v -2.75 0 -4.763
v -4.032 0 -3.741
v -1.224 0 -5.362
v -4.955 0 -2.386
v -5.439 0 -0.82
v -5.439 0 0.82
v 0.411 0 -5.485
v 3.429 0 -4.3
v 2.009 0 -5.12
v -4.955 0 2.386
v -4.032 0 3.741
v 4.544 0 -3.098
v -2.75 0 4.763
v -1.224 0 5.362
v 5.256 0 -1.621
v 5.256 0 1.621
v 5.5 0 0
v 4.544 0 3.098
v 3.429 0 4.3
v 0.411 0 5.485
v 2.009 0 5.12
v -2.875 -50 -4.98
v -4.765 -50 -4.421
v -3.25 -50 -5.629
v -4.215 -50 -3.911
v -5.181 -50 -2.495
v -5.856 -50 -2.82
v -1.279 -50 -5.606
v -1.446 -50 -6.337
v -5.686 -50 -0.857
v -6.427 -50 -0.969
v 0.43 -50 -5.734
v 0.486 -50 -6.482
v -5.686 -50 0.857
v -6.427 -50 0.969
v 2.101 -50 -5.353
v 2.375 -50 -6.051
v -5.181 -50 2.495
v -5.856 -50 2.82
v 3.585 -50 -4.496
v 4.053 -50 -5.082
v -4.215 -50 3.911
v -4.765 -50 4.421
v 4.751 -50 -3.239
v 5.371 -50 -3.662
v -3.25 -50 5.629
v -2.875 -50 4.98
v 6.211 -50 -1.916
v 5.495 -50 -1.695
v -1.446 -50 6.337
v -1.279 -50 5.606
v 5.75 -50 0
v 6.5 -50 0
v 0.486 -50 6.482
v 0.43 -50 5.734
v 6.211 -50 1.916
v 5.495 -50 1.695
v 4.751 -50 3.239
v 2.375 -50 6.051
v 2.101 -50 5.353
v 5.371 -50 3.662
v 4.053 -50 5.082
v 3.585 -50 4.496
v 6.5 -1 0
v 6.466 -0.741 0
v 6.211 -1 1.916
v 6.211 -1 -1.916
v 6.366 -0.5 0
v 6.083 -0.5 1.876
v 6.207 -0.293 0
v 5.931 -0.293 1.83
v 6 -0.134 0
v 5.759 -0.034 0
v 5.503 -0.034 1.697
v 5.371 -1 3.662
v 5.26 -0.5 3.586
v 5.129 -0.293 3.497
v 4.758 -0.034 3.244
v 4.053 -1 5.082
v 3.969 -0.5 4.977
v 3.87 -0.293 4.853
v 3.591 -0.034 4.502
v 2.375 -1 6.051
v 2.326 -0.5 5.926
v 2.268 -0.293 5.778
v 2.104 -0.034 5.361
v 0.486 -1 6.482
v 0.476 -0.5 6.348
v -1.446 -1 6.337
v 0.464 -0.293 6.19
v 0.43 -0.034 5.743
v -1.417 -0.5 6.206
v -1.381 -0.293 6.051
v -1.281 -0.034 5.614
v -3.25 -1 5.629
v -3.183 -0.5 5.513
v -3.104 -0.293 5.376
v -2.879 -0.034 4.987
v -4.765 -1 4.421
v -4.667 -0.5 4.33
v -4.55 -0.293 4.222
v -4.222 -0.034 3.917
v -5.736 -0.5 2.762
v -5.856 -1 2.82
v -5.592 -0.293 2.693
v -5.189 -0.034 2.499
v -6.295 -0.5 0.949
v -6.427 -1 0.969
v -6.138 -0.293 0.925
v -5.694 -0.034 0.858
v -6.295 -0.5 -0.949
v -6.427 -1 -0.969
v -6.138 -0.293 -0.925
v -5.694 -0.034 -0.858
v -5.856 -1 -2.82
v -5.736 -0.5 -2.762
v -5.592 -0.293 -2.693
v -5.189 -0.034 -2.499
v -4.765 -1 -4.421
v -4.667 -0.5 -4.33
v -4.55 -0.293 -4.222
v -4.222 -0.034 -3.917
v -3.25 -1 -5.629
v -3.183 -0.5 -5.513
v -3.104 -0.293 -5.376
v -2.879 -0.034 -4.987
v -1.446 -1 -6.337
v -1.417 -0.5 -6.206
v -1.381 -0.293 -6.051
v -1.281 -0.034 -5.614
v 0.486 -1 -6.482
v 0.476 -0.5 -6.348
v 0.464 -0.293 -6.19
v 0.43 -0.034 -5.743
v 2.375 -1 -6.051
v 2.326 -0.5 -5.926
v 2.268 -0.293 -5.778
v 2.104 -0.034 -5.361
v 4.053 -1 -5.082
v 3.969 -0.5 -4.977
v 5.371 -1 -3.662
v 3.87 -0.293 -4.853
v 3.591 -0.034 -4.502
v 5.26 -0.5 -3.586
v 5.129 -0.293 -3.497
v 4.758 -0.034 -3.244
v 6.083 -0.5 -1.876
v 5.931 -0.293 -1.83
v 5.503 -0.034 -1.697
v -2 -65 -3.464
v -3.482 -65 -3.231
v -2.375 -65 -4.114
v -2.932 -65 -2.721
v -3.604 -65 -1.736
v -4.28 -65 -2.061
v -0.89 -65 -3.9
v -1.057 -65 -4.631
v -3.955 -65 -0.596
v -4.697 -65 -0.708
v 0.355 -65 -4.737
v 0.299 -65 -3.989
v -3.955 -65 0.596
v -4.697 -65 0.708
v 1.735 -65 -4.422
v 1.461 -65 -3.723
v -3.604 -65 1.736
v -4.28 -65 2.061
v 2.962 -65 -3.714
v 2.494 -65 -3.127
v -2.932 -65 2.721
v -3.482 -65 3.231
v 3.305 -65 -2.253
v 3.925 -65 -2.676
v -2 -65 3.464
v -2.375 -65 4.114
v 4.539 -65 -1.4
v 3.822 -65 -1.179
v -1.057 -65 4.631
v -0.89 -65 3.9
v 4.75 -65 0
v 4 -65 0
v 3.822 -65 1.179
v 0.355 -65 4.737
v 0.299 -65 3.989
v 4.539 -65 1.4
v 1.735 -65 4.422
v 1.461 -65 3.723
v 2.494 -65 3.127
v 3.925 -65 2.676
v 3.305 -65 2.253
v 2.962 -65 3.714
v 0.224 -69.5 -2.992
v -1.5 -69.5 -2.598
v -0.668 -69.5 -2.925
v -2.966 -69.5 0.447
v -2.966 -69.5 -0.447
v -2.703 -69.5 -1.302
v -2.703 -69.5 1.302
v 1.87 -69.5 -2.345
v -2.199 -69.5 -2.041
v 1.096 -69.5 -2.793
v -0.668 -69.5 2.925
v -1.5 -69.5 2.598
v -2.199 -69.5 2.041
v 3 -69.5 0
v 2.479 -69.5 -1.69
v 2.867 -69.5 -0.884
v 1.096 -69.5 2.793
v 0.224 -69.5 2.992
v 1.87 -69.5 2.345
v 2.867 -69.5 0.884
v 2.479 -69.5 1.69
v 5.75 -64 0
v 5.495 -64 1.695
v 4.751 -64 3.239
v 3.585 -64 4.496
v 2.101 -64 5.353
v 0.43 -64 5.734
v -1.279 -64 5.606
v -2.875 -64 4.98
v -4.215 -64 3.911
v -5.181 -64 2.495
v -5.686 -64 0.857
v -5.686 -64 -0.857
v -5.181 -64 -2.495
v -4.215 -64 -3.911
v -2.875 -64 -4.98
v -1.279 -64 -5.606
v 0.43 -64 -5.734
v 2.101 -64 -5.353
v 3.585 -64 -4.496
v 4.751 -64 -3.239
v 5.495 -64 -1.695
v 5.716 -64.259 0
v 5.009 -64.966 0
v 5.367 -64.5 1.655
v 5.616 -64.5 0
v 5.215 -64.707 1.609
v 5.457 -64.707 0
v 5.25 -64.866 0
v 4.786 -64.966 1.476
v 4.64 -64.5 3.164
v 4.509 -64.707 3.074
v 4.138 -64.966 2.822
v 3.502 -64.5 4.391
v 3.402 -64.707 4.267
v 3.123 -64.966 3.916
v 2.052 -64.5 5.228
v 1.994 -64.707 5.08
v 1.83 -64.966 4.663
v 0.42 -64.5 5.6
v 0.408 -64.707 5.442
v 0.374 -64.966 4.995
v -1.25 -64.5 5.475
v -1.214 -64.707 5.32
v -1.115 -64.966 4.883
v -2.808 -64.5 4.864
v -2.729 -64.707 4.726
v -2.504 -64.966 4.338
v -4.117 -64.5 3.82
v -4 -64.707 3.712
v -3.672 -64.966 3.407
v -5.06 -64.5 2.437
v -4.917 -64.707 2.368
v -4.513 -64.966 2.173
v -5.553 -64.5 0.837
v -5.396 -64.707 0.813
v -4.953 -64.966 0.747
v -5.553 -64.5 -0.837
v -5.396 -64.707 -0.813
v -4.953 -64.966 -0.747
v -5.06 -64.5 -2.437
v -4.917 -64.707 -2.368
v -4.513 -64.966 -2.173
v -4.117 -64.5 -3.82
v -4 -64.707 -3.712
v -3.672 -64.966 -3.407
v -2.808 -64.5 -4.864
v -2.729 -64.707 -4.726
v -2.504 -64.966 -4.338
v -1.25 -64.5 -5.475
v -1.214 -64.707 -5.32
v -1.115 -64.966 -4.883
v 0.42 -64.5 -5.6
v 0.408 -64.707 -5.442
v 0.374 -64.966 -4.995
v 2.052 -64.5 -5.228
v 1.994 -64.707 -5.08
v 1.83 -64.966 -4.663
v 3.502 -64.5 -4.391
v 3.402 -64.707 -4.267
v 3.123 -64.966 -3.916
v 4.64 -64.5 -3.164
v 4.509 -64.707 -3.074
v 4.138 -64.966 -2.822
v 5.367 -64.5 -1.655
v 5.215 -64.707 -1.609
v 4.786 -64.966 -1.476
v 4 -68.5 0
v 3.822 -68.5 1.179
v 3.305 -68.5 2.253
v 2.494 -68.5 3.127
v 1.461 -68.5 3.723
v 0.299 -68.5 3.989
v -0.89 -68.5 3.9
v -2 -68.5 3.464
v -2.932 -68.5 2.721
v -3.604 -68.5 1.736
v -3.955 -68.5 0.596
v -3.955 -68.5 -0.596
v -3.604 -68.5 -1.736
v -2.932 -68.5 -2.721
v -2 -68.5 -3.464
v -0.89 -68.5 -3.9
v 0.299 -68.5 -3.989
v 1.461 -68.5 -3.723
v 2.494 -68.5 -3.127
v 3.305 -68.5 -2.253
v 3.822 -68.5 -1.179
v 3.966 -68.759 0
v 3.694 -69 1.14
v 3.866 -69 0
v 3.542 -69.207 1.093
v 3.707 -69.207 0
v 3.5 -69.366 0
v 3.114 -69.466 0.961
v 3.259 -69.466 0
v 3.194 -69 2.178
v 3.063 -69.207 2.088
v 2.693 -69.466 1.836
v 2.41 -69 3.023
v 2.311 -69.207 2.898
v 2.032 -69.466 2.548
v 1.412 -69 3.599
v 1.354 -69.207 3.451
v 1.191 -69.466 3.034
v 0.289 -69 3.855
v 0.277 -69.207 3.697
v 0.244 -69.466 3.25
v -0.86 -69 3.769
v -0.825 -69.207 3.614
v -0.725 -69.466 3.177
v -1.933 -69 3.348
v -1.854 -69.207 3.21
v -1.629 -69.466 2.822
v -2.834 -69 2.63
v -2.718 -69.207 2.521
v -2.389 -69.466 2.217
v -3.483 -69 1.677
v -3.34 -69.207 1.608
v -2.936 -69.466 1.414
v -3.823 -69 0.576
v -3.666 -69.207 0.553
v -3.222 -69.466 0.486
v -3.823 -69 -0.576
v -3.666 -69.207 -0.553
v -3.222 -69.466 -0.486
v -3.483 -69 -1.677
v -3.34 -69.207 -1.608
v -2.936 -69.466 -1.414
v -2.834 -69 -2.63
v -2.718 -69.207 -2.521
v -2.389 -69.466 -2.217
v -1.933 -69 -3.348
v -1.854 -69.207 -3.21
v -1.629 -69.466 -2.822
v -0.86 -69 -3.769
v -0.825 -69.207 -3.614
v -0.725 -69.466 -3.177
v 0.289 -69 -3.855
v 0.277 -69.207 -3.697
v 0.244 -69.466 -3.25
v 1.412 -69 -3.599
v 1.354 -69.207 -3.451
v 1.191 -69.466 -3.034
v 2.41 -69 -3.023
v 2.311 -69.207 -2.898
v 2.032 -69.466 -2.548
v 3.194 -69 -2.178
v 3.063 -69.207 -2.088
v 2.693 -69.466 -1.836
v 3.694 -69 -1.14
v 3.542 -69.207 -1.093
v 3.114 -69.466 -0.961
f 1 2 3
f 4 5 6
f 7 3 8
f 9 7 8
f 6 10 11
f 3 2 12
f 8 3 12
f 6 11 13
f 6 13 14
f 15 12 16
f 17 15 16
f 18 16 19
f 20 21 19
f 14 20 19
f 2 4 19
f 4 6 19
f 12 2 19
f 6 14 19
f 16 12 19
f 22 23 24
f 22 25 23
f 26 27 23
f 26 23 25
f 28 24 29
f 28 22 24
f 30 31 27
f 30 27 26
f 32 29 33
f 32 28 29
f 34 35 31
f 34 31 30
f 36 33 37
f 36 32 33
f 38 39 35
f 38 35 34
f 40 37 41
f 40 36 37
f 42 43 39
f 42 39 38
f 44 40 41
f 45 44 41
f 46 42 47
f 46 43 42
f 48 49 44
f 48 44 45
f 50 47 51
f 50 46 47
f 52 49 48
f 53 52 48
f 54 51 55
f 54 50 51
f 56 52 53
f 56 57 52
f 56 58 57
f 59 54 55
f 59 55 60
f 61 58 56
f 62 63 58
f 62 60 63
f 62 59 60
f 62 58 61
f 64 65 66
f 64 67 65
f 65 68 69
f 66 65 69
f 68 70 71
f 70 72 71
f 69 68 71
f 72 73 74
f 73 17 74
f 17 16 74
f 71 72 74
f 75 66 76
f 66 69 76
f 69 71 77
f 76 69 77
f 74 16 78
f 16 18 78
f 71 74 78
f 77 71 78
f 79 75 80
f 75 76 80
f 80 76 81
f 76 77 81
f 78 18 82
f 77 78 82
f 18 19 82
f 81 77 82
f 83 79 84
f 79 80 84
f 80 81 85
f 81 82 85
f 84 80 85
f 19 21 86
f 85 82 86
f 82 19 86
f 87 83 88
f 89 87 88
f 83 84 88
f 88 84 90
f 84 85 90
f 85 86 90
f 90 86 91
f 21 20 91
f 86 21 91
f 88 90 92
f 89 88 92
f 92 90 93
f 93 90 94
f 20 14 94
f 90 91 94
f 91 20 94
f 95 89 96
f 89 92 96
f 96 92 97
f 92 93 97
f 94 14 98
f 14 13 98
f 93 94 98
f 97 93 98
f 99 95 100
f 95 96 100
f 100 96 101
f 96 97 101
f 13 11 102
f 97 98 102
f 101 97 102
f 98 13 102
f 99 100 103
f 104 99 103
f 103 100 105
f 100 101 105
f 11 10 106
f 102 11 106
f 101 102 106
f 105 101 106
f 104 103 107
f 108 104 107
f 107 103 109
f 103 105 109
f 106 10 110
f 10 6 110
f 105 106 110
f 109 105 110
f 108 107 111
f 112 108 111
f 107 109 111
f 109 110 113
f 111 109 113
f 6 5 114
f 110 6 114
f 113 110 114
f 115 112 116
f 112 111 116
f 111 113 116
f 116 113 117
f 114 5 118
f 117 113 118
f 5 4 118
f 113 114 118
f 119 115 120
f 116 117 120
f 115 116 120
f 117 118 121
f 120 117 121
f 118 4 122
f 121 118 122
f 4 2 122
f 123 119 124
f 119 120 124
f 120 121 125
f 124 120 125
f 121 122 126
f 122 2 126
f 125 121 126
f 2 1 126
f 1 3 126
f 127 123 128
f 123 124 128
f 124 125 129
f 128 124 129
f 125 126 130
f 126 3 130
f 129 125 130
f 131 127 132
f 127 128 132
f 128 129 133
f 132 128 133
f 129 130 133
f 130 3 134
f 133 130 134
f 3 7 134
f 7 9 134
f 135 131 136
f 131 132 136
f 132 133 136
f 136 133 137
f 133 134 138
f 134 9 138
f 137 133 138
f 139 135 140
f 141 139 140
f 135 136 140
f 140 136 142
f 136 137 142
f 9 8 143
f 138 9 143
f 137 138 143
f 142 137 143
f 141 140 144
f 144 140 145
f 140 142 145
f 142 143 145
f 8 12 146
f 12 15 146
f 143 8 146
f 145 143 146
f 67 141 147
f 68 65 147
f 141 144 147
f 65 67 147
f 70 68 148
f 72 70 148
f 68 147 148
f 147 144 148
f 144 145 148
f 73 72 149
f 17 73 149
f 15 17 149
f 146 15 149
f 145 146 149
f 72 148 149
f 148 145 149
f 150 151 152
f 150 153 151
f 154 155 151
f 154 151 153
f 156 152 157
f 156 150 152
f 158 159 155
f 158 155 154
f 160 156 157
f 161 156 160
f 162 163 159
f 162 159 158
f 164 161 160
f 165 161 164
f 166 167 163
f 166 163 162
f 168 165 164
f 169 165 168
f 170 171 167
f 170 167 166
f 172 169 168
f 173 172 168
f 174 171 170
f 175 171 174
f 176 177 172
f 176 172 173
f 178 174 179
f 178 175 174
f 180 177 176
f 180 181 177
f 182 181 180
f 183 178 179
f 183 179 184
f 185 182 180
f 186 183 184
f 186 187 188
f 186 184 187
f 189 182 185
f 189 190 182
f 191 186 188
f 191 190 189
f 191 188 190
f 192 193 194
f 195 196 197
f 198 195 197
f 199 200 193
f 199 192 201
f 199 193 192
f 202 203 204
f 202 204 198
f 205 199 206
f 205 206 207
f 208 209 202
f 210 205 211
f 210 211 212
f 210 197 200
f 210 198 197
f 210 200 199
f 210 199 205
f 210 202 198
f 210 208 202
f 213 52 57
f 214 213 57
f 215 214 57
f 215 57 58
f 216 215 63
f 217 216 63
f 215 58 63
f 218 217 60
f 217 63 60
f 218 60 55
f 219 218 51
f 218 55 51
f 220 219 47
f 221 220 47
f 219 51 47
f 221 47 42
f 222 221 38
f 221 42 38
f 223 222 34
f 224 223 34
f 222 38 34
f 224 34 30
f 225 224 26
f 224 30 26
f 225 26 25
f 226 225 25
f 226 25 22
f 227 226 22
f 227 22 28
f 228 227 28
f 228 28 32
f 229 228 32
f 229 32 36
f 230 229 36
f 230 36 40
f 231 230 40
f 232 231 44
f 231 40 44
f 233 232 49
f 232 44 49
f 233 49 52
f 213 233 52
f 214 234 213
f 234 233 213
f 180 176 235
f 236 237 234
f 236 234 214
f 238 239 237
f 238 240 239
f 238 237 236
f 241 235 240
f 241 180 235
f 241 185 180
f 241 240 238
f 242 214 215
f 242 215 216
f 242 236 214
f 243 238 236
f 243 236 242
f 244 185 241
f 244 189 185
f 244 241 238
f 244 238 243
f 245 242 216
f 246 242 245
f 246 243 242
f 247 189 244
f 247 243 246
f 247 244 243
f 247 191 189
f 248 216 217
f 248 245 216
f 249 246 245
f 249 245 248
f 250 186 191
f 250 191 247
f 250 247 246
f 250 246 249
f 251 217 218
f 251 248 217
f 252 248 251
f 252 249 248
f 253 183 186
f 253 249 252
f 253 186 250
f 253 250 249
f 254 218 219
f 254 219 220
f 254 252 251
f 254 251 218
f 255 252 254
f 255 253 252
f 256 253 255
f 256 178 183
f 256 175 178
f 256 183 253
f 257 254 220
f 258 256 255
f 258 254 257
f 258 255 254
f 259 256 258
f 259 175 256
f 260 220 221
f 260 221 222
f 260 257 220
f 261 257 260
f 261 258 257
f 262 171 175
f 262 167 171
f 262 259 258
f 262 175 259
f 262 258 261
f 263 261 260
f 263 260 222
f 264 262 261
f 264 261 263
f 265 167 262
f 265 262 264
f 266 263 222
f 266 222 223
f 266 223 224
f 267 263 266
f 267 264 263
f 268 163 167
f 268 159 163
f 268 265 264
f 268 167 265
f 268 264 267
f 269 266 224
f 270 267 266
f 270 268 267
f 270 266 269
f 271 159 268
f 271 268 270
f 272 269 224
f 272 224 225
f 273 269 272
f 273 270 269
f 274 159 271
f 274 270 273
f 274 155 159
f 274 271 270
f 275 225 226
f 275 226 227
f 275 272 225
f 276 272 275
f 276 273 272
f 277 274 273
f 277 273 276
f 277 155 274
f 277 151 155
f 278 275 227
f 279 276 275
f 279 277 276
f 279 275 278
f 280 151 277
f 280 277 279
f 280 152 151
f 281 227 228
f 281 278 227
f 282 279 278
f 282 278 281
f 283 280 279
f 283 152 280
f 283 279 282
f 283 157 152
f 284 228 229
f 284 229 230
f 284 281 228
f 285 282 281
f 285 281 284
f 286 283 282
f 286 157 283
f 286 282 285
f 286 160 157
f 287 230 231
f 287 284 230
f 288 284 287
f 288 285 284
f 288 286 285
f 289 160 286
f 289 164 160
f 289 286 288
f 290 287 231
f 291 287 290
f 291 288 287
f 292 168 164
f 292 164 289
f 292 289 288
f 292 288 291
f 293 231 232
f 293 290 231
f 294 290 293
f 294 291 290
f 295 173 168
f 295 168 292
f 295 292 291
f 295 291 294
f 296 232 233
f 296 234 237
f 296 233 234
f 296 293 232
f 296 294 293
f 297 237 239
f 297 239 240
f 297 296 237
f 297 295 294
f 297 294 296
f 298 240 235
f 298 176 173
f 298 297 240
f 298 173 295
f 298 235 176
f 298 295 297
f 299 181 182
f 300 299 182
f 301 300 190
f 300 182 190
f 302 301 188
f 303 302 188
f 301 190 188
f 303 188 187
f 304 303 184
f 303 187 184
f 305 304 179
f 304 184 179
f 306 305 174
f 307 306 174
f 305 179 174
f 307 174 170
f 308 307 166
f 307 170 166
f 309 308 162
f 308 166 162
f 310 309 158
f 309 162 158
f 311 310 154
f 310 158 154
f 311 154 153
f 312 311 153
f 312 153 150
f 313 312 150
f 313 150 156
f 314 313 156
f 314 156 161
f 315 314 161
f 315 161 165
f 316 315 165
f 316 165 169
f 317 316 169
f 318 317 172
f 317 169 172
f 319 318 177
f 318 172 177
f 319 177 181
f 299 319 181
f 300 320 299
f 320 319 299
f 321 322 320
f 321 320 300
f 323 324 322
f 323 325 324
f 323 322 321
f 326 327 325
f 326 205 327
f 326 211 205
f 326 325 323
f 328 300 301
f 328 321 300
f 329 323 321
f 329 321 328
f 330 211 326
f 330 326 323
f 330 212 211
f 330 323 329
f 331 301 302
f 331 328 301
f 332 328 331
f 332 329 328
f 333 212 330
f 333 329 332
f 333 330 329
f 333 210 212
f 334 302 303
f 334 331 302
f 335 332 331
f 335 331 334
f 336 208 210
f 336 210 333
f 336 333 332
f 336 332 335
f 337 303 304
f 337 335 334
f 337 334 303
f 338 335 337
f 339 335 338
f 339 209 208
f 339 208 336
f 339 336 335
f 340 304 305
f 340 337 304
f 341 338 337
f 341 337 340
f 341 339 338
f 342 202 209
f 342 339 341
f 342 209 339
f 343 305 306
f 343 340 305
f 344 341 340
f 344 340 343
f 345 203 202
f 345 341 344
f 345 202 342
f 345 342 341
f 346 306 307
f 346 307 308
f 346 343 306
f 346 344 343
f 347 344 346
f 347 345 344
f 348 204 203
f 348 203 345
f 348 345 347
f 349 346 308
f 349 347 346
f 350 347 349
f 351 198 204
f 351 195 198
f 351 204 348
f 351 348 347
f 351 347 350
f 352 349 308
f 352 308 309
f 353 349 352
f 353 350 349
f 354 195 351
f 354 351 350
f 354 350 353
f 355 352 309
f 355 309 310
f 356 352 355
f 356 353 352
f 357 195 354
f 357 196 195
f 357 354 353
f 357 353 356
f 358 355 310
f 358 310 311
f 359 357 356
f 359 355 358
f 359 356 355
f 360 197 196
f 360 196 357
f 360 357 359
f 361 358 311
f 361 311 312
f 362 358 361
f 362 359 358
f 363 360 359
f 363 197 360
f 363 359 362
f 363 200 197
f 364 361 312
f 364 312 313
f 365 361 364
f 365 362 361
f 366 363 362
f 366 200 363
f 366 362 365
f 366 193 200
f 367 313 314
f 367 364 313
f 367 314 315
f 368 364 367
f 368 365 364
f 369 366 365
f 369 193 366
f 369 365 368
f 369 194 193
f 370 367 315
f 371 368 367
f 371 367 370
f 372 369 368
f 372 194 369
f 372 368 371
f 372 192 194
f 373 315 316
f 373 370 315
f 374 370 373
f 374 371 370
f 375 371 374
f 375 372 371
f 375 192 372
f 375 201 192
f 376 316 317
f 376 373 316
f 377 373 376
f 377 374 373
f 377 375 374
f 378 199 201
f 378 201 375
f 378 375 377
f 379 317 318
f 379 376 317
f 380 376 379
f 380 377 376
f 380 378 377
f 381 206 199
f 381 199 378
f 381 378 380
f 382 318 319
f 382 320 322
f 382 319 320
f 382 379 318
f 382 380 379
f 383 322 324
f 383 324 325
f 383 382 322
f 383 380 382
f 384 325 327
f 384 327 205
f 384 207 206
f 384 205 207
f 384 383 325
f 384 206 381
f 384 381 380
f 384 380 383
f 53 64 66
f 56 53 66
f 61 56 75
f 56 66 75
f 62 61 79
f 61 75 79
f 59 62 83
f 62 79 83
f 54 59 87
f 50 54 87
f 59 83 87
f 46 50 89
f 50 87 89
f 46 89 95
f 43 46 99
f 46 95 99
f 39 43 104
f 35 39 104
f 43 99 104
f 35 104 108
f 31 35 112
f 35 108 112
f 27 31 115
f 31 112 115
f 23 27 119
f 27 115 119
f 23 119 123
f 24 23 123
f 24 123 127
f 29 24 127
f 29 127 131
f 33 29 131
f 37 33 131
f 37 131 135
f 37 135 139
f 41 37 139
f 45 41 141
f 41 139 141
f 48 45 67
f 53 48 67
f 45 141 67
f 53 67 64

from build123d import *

# Parameters (mm, degrees)
F0_R     = 6.5
F1_DEPTH = 50
F2_R     = 5.75
F3_DEPTH = 15
F4_R     = 4
F5_DEPTH = 4.5
F6_R     = 1


with BuildPart() as f1:
    # F0 (on Front) → F1 (new body)
    with BuildSketch(Plane.XZ):
        Circle(F0_R)
    extrude(amount=F1_DEPTH)

    # F2 (on face) → F3 (join)
    with BuildSketch(Plane.XZ.offset(50)):
        Circle(F2_R)
    extrude(amount=F3_DEPTH)

    # F4 (on face) → F5 (join)
    with BuildSketch(Plane.XZ.offset(65)):
        Circle(F4_R)
    extrude(amount=F5_DEPTH)

    # F6
    f6_edges = [f1.edges().sort_by_distance(p)[0] for p in [
        (-4, -69.5, 0),
        (-5.75, -65, 0),
        (-6.5, 0, 0),
    ]]
    fillet(f6_edges, radius=F6_R)


solid = f1.part
